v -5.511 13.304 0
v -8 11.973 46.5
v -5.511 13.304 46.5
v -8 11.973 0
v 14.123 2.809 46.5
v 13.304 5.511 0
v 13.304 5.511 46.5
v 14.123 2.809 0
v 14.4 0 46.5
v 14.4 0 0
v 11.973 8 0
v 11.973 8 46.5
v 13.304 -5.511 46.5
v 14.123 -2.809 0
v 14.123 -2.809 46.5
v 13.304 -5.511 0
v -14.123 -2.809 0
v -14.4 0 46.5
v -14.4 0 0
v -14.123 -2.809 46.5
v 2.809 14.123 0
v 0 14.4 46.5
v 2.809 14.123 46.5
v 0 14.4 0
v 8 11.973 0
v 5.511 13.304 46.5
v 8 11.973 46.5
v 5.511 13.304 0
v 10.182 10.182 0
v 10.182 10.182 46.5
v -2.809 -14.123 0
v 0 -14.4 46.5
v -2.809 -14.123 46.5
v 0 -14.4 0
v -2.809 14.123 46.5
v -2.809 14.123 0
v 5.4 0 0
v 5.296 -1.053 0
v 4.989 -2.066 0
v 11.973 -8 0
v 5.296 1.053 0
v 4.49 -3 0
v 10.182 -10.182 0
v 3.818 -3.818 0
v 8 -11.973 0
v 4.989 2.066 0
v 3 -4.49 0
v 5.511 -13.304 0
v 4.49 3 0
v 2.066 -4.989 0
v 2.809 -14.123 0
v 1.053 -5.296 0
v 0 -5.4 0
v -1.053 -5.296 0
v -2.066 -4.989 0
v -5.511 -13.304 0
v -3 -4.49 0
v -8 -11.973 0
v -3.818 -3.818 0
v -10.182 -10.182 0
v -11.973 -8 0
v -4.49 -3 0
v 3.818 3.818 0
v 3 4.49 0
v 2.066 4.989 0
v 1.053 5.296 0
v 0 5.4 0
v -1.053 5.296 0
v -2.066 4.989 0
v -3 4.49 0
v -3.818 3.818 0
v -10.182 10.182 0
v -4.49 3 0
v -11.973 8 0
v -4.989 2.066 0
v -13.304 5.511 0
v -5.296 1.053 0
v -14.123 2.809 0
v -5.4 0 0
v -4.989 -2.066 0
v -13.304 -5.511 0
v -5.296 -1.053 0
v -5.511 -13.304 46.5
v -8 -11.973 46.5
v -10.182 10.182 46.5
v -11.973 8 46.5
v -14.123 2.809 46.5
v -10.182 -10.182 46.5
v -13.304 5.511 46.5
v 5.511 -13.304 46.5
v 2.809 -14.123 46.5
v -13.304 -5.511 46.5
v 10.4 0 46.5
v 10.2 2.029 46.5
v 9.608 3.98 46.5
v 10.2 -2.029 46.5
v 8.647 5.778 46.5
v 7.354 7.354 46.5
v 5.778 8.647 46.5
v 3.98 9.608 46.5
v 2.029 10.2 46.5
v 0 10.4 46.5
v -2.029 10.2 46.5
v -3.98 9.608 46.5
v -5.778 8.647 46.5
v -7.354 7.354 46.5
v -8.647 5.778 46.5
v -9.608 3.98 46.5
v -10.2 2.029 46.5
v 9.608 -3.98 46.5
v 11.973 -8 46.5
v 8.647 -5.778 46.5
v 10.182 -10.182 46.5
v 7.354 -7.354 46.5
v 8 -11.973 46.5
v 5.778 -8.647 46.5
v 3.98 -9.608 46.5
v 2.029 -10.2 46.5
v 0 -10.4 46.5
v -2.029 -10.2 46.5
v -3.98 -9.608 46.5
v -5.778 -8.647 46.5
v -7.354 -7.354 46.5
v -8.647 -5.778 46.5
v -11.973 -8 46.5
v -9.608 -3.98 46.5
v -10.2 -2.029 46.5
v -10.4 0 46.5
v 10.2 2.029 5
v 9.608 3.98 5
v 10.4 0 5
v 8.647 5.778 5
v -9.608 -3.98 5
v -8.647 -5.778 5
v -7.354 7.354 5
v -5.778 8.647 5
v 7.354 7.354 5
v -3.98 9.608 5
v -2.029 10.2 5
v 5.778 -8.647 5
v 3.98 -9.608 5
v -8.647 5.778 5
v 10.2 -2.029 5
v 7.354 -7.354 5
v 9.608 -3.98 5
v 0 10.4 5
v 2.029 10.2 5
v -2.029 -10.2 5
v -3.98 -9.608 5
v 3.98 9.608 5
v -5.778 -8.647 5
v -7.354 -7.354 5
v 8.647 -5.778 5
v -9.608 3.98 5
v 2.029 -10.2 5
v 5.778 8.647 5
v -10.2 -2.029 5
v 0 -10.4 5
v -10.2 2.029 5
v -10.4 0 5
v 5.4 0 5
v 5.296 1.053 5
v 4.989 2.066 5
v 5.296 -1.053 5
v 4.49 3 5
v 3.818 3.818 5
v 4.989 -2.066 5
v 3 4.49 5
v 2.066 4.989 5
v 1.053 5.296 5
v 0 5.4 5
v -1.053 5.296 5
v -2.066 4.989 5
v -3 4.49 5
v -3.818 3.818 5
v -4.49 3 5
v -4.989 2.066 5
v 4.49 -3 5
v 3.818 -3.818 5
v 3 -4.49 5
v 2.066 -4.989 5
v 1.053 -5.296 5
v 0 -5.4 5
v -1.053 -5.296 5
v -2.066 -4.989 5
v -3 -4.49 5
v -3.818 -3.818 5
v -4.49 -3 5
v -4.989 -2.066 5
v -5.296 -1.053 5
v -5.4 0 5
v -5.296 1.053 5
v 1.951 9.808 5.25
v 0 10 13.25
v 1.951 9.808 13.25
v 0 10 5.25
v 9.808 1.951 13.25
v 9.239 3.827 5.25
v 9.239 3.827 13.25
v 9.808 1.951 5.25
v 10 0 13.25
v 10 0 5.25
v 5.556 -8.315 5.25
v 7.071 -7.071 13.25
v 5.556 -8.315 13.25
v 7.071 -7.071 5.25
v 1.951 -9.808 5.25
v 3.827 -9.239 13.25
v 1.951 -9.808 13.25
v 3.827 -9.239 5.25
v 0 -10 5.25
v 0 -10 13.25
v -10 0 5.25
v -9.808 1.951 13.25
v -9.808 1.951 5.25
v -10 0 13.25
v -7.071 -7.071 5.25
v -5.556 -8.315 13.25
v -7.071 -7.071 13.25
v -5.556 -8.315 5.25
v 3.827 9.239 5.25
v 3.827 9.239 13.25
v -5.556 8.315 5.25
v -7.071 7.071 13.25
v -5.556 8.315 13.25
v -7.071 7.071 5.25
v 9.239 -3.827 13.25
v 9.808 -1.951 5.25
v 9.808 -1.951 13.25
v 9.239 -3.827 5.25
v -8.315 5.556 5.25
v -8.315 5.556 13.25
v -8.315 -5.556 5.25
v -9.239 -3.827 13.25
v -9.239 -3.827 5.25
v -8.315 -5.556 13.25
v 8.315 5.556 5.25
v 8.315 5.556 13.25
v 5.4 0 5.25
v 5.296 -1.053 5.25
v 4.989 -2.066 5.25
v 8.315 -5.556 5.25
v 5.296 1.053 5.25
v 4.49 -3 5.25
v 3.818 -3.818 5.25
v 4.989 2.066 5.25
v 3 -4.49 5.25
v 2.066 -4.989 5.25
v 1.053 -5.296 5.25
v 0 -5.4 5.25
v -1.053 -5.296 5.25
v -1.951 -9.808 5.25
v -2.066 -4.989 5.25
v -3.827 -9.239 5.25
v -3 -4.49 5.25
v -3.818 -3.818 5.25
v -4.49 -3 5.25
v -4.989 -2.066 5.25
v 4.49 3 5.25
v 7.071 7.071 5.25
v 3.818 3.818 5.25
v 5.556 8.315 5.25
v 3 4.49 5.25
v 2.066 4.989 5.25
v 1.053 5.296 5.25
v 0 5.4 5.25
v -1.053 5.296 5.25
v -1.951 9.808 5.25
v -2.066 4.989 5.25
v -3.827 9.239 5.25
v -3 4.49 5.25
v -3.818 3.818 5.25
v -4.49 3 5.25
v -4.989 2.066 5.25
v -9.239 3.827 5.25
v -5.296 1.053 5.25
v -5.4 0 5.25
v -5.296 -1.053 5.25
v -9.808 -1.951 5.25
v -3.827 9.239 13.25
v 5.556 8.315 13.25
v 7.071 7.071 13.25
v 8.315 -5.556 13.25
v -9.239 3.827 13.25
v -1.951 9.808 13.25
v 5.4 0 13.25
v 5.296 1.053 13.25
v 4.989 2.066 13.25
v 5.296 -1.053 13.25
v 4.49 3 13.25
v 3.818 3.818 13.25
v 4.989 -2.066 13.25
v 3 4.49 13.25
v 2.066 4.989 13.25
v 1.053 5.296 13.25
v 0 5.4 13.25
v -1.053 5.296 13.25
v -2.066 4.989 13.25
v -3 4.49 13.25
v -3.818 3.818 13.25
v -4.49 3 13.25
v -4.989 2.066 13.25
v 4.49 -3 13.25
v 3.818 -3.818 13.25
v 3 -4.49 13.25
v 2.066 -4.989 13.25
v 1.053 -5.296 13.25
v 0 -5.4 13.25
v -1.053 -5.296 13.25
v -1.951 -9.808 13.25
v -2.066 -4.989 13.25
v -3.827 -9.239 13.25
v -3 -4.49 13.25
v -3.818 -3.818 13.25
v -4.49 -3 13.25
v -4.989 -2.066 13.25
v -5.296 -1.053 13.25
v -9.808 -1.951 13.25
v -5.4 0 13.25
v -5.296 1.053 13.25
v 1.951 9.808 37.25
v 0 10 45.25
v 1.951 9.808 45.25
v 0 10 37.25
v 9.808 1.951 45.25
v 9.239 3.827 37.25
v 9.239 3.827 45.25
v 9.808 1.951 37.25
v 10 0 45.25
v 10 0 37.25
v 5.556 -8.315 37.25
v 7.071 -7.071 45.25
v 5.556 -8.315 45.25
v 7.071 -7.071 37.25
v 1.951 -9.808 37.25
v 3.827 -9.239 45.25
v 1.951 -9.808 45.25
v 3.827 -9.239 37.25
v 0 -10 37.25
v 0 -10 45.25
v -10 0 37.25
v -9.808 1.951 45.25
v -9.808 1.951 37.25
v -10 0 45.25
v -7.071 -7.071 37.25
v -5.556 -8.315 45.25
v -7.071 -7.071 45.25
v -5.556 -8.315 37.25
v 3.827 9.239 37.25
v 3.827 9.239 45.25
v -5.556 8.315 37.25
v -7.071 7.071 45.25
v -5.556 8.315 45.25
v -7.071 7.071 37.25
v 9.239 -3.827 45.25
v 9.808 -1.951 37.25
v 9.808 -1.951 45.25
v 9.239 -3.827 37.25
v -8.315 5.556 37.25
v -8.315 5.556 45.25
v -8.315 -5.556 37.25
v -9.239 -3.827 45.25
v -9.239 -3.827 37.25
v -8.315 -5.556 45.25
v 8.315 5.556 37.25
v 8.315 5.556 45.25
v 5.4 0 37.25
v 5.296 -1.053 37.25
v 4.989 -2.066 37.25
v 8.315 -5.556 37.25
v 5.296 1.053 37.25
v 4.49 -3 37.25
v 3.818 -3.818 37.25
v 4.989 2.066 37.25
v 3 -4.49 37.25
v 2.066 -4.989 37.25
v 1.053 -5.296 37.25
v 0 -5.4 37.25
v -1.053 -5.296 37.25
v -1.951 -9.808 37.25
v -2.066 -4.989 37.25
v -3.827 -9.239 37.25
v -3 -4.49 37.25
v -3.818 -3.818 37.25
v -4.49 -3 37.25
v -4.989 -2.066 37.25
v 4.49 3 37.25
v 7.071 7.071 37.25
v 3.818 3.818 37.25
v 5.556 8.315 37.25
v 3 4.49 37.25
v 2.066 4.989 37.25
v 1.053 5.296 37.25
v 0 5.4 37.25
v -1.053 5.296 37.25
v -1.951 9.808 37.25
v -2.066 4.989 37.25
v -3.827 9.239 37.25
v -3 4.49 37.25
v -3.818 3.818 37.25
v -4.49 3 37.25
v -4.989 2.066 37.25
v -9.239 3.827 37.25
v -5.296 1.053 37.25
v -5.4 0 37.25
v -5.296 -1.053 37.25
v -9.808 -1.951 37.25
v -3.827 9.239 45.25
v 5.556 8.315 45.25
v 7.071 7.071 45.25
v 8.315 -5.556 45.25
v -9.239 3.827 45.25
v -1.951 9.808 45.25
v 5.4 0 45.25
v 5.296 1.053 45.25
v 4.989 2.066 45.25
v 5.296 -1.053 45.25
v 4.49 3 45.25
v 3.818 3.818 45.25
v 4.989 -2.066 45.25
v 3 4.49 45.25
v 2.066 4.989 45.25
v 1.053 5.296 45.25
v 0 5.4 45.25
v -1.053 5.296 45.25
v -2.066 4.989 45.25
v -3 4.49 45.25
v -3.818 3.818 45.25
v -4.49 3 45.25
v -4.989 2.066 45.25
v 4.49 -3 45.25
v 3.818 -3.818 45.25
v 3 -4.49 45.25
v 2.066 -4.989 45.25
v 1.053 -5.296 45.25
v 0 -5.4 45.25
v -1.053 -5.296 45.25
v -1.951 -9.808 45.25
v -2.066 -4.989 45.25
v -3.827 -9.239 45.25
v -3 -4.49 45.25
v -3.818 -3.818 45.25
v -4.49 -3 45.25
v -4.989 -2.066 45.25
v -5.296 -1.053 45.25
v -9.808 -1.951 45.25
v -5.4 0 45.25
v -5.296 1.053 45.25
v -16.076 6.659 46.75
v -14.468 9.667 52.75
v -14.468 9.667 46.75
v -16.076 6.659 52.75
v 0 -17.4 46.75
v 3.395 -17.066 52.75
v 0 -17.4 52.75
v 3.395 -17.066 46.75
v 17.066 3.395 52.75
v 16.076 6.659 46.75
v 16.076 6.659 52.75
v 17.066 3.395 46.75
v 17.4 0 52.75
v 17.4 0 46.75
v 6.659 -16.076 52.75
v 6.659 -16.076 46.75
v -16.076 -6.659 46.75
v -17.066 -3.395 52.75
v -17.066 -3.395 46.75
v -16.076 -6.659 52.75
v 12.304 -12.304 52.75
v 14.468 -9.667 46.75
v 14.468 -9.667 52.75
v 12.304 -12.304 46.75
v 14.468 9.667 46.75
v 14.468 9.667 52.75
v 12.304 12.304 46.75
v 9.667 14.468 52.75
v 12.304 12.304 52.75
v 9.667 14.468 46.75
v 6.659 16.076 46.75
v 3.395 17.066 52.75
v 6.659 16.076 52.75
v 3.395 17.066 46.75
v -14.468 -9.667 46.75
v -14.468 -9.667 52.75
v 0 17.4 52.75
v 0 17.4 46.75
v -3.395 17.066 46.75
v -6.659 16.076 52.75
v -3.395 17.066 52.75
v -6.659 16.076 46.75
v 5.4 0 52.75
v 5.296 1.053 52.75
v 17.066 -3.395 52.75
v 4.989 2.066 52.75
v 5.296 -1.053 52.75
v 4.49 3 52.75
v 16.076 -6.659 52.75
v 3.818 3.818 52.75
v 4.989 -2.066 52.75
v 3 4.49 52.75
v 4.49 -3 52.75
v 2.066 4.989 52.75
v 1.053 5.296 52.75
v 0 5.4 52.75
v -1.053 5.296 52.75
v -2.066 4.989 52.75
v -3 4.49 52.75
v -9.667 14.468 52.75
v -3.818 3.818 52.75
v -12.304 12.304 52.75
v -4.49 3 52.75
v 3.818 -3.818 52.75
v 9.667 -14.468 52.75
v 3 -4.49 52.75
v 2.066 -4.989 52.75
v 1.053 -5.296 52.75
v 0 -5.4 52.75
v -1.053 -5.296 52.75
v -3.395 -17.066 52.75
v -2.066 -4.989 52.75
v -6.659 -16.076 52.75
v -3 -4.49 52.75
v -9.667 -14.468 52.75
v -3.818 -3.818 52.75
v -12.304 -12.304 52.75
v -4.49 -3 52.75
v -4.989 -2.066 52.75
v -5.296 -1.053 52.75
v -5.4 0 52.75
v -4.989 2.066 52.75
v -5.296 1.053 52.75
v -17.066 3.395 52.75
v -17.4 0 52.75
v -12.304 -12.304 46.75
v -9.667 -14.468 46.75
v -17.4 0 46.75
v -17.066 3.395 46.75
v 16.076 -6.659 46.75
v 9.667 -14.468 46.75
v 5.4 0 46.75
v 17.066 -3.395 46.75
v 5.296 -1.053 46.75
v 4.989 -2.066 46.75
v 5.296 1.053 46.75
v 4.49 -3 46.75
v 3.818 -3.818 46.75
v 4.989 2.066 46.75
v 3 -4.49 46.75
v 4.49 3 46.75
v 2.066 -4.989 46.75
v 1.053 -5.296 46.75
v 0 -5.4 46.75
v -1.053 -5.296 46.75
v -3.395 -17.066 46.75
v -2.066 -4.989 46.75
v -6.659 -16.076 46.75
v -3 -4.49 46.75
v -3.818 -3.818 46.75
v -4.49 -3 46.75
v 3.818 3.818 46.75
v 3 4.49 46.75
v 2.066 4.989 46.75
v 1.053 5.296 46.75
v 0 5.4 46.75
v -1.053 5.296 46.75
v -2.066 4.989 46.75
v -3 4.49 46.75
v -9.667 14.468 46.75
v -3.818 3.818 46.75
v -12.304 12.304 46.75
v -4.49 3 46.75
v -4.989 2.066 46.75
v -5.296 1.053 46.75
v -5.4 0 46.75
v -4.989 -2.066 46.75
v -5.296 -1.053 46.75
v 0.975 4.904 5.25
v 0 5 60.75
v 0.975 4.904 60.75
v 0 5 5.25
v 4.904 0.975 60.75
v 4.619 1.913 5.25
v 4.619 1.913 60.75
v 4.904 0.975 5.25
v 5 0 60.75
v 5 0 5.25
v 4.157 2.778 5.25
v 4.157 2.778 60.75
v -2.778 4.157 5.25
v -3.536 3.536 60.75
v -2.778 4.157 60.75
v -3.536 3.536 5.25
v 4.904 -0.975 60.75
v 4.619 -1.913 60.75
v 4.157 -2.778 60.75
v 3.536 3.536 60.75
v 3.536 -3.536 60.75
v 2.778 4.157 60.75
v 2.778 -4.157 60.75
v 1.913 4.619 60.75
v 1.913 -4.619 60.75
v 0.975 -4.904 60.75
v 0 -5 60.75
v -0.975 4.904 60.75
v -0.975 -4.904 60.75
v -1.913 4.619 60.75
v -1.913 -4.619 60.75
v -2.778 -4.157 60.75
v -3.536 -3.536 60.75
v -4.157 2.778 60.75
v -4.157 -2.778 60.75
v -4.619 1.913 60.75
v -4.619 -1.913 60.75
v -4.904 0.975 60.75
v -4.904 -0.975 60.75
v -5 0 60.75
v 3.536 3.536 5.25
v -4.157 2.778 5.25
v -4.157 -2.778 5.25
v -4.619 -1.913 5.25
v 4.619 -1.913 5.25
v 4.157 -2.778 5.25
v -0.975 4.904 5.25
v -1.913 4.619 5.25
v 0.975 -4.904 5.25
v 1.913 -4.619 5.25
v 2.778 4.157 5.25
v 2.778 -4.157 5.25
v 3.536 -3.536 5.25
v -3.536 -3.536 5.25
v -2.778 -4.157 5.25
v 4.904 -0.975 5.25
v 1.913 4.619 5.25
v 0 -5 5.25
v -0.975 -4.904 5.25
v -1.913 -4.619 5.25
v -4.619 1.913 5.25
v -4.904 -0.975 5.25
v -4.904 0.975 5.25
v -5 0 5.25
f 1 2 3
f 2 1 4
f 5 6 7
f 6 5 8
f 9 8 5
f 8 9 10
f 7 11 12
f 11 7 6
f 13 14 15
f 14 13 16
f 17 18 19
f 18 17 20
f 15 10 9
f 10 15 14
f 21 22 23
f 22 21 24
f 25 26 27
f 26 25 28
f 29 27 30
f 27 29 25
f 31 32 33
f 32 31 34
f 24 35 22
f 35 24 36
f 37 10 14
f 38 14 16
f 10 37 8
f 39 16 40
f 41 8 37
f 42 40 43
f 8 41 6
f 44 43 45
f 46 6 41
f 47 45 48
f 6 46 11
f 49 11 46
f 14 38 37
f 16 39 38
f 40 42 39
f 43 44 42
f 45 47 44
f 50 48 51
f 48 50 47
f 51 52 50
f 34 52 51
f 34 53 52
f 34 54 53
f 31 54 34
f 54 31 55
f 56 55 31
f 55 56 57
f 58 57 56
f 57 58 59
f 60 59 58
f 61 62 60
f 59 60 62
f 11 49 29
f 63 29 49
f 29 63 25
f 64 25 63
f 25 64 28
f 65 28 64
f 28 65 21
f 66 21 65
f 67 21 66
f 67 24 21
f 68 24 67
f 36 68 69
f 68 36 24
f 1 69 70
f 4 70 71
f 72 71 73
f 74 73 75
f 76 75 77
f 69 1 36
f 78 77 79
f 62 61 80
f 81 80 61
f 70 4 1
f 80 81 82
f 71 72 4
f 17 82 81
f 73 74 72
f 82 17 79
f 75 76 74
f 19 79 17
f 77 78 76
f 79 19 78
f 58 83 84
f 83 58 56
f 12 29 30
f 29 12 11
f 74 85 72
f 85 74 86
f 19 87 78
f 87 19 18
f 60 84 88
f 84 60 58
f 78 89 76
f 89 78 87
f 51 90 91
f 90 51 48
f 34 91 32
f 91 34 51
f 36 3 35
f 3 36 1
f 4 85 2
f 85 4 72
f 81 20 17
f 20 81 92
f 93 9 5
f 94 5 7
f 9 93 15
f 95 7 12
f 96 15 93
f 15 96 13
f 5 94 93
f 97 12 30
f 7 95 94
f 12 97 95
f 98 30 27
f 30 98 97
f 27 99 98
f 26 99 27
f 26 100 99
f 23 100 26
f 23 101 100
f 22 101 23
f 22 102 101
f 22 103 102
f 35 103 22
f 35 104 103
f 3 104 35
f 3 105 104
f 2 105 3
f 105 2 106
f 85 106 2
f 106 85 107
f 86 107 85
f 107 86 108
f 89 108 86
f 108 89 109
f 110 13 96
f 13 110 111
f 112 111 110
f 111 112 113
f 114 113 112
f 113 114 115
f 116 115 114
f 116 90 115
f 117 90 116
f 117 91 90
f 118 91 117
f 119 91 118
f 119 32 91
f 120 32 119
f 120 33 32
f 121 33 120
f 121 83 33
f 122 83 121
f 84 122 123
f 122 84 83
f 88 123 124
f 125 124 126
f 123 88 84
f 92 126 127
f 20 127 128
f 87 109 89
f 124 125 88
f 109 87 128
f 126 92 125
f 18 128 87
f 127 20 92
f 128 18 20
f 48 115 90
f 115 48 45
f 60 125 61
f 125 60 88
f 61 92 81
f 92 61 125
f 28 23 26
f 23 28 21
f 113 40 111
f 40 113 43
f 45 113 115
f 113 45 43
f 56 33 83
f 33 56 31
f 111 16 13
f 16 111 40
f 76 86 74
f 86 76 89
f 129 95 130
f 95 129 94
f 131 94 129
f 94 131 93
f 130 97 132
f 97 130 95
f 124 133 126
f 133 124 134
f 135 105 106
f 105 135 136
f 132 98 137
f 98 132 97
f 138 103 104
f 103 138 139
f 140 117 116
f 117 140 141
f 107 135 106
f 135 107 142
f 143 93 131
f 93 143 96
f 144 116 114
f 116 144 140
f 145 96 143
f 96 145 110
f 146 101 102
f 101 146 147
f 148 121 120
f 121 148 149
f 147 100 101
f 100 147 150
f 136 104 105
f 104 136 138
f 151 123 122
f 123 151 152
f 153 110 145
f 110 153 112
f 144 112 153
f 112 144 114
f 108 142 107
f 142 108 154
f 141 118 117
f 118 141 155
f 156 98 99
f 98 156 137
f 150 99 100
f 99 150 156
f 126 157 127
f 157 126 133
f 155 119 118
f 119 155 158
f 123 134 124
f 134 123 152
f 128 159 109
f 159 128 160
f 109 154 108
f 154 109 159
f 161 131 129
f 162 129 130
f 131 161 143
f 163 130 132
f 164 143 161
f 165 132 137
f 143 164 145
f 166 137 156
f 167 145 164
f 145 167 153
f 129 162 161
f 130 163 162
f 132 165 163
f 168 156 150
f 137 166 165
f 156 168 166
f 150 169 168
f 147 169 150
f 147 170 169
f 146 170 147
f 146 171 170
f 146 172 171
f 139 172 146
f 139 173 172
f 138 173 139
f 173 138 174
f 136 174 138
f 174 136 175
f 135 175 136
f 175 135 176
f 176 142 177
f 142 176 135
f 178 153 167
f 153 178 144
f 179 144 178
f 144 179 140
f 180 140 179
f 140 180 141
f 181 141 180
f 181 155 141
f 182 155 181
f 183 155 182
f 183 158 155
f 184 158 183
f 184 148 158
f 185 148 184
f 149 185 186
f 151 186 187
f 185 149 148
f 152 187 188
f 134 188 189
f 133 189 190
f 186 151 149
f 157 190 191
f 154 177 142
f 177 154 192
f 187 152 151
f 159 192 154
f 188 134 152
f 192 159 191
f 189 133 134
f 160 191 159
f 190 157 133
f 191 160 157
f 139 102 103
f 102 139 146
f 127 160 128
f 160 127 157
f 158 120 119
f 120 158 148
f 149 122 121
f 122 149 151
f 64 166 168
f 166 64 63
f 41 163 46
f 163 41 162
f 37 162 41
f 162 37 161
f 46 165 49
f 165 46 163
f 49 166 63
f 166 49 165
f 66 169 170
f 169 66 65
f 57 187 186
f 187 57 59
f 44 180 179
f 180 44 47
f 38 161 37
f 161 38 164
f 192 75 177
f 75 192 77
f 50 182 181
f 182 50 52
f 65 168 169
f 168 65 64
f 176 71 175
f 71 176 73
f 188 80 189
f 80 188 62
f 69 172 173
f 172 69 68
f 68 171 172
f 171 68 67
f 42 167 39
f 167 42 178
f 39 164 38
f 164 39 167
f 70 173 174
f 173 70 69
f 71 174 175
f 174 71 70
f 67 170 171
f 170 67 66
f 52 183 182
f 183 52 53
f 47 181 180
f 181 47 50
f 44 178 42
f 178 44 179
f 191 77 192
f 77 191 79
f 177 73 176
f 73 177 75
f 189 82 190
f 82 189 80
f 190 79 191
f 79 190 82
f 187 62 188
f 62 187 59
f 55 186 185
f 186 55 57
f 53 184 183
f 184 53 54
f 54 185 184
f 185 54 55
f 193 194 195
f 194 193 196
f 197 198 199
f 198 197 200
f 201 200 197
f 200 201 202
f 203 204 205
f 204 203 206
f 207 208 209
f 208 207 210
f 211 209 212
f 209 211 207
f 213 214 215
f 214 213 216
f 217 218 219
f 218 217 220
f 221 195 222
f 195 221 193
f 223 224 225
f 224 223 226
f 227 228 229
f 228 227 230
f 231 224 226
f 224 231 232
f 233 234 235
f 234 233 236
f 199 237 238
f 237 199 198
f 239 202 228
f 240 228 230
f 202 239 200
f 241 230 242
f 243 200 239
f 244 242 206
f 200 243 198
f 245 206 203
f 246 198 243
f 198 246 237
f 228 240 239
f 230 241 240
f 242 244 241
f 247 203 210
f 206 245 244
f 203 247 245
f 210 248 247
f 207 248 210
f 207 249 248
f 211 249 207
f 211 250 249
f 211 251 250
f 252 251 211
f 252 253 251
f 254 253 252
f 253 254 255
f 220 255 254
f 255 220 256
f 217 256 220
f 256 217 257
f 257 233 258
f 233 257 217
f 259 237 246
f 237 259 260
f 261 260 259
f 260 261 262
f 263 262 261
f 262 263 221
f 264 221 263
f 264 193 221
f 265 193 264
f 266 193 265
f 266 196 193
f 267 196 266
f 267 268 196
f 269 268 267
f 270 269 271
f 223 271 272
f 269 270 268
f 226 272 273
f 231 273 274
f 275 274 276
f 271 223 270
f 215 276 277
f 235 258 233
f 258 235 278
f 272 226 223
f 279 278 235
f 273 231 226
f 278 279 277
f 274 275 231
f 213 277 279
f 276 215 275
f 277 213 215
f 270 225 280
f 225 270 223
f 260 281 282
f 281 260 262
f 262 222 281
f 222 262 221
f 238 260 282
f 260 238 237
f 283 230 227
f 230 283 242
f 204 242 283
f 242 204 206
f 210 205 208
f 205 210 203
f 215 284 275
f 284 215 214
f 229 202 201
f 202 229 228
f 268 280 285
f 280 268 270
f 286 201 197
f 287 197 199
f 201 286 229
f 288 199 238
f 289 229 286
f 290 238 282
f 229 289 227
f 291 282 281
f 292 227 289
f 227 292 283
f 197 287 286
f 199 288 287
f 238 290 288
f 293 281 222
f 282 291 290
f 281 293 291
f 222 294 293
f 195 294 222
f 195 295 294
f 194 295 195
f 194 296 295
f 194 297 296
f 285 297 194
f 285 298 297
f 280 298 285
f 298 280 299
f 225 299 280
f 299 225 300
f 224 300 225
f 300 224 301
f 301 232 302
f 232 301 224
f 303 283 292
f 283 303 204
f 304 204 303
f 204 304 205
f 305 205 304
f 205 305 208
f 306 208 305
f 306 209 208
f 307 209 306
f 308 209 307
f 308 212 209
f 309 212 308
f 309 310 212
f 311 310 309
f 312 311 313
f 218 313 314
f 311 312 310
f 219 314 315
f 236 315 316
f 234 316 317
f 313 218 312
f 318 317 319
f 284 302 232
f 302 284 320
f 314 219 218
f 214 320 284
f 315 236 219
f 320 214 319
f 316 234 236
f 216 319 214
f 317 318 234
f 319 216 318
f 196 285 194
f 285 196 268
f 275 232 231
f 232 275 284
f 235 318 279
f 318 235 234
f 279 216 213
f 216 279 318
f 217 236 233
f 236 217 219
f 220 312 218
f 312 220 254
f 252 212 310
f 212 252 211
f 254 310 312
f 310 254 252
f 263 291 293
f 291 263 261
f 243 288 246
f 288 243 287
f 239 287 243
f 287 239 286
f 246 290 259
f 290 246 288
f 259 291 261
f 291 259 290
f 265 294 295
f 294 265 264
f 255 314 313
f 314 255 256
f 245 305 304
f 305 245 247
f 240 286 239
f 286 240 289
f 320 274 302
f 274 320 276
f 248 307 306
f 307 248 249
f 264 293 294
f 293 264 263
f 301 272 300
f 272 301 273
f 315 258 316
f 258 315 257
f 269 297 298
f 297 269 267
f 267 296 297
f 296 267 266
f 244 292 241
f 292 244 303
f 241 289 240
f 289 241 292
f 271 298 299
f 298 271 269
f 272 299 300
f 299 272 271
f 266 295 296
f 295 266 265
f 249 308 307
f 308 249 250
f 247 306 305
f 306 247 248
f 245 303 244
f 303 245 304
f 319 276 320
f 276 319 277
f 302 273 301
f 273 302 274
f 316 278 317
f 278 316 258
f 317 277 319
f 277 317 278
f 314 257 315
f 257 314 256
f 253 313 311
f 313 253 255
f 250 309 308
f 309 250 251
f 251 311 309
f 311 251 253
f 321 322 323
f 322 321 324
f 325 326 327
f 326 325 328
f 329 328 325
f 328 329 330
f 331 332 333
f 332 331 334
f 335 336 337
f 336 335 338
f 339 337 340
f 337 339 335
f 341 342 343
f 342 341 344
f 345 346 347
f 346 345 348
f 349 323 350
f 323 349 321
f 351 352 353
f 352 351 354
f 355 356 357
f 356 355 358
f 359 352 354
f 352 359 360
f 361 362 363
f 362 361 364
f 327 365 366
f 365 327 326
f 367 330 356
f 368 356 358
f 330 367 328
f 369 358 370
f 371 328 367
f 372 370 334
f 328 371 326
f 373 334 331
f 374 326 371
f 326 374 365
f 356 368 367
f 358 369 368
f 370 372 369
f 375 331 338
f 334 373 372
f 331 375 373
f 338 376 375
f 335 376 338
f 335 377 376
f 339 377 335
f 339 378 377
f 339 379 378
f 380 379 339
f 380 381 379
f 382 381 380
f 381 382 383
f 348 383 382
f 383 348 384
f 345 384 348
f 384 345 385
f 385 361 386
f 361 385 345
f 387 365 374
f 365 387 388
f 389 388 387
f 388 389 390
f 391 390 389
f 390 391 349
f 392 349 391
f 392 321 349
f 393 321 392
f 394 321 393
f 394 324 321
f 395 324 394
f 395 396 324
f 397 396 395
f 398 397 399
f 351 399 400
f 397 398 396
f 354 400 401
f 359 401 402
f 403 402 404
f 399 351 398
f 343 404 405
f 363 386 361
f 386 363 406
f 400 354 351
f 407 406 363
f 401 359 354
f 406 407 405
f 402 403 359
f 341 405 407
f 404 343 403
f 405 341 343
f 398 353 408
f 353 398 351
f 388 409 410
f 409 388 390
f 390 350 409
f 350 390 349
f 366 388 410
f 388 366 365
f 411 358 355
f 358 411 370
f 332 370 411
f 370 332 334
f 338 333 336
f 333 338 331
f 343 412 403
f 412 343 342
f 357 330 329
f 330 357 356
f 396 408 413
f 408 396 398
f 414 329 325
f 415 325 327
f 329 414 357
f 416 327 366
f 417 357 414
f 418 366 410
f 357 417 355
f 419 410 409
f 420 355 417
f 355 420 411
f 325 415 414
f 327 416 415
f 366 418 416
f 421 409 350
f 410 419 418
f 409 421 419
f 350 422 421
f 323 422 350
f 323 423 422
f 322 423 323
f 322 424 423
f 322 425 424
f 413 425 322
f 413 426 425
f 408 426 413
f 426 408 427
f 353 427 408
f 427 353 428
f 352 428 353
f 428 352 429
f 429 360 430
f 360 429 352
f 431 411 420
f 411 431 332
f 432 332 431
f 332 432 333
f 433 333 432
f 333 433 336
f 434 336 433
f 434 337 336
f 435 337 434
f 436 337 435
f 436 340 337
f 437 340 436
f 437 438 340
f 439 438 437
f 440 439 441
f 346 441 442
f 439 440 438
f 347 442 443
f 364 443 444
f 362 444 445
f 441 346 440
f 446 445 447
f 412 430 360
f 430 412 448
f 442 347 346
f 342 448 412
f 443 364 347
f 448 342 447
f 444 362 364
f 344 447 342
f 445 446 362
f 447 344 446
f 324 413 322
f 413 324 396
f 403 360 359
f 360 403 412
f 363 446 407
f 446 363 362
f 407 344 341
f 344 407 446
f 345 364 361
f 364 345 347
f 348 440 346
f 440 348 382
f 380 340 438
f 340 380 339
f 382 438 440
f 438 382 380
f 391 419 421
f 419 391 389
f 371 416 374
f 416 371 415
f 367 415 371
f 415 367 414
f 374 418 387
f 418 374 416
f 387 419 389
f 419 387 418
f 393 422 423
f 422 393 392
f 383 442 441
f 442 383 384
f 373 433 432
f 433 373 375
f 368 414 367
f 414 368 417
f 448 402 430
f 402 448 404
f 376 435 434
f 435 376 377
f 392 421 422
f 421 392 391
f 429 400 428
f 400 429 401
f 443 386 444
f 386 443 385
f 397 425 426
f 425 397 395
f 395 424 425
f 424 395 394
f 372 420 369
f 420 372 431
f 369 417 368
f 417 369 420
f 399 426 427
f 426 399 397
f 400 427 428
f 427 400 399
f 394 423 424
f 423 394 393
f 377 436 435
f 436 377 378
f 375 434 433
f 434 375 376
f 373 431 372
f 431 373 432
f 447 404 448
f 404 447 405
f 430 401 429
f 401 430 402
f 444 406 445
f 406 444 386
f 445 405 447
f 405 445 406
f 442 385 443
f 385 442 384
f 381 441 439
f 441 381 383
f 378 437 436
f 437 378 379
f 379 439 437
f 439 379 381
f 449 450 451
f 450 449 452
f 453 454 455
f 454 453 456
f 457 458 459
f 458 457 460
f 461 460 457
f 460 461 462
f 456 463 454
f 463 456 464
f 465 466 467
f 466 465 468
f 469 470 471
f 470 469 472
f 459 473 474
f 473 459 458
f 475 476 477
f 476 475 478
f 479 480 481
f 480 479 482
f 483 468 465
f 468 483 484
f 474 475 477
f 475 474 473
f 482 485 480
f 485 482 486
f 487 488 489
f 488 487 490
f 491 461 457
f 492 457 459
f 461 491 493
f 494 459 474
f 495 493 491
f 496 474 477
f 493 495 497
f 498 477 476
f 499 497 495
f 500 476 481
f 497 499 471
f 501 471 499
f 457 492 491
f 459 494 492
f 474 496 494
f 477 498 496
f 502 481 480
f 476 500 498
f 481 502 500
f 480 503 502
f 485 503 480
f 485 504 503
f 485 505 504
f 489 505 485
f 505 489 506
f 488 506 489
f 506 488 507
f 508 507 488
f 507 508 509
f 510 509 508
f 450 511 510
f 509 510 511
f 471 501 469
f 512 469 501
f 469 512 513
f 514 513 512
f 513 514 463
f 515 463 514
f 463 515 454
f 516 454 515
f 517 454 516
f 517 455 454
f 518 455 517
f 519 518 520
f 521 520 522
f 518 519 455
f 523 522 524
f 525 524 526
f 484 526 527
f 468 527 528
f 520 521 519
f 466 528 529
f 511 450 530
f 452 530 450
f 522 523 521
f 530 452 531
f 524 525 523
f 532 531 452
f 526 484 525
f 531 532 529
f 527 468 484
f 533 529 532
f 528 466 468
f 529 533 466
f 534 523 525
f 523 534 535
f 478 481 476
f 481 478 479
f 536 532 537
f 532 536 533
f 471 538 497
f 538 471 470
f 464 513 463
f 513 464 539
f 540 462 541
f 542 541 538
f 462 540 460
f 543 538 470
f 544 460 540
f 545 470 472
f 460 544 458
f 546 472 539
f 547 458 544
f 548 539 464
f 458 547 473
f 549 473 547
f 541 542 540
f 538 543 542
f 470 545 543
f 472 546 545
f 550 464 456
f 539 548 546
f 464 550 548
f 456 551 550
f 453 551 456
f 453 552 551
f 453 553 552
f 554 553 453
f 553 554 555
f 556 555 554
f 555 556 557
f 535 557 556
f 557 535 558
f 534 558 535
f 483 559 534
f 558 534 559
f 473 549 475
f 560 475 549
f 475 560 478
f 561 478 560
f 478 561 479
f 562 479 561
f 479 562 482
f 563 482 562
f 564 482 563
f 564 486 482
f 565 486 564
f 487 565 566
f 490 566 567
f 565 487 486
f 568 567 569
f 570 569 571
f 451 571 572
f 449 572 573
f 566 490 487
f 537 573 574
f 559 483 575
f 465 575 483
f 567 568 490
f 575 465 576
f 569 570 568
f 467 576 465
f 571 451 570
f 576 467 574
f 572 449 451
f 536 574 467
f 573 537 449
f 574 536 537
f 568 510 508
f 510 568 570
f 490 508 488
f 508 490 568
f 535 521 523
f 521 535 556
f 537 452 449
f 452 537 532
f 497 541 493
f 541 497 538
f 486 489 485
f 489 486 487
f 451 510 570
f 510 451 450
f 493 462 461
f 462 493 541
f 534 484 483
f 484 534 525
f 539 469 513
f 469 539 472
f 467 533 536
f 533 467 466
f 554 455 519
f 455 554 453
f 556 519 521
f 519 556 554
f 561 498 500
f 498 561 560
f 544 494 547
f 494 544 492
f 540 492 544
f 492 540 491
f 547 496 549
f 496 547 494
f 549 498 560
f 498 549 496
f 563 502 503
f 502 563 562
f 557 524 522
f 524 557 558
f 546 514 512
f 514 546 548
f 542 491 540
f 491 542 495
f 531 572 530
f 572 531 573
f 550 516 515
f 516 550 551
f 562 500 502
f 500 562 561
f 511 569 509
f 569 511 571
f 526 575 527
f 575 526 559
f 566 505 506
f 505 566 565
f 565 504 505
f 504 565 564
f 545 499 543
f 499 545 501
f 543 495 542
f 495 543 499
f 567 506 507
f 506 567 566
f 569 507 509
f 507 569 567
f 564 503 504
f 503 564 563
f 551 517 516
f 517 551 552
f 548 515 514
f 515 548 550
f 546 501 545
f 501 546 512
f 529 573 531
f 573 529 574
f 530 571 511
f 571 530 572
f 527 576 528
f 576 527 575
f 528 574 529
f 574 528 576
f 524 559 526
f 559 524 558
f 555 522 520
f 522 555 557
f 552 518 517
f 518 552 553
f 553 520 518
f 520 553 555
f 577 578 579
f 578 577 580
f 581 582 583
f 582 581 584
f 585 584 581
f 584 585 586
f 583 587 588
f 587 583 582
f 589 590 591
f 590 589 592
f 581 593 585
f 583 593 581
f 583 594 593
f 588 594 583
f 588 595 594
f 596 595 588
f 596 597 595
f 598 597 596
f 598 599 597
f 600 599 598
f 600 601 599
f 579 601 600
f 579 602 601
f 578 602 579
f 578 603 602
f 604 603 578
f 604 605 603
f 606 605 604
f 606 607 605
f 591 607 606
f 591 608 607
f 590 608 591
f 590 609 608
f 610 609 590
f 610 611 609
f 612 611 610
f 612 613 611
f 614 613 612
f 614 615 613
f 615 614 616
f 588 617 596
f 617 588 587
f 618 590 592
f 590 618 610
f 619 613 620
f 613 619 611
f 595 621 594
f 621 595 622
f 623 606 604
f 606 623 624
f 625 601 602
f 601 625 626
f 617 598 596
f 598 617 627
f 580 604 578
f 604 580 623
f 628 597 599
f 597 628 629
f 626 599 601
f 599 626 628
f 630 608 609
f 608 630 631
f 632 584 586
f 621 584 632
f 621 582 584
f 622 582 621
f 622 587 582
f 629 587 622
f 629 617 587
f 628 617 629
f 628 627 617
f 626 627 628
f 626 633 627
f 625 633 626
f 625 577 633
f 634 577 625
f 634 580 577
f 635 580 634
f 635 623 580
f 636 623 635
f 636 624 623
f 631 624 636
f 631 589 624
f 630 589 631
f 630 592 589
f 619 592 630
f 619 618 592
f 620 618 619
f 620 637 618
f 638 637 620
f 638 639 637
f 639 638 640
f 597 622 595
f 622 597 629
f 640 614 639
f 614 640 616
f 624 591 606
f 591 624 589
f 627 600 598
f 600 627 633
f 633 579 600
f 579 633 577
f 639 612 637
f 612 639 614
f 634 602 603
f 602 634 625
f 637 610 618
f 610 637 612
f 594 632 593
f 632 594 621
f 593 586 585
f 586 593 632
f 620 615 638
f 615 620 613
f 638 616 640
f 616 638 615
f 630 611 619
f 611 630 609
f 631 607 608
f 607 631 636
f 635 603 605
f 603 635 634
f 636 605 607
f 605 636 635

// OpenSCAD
$fn = 32;

// ------------------------------------------------------------------------
// Shaft station: cup d28.8 x 46.5 mm, shaft d10
// Every part is its own module, assembly() places every instance.
// ------------------------------------------------------------------------

// --- part 1 ---
module housing_cup() {
  difference() {
    cylinder(h = 46.5, d = 28.8);
    translate([0, 0, 5]) cylinder(h = 42.5, d = 20.8);
    translate([0, 0, -1]) cylinder(h = 7, d = 10.8);
  }
}

// --- part 2 ---
module bearing_lower() {
  difference() {
      translate([0, 0, 0]) cylinder(h = 8, d = 20);
      translate([0, 0, -1]) cylinder(h = 10, d = 10.8);
    }
}

// --- part 3 ---
module bearing_upper() {
  difference() {
      translate([0, 0, 0]) cylinder(h = 8, d = 20);
      translate([0, 0, -1]) cylinder(h = 10, d = 10.8);
    }
}

// --- part 4 ---
module station_shaft() {
  translate([0, 0, -27.75]) cylinder(h = 55.5, d = 10);
}

// --- part 5 ---
module station_cover() {
  difference() {
    cylinder(h = 6, d = 34.8);
    translate([0, 0, -1]) cylinder(h = 8, d = 10.8);
  }
}

// --- assembly ---
module assembly() {
  color([0.80, 0.24, 0.20]) translate([0, 0, 0]) rotate([0, 0, 0]) housing_cup();
  color([0.20, 0.45, 0.75]) translate([0, 0, 5.25]) rotate([0, 0, 0]) bearing_lower();
  color([0.25, 0.62, 0.32]) translate([0, 0, 37.25]) rotate([0, 0, 0]) bearing_upper();
  color([0.92, 0.70, 0.18]) translate([0, 0, 33]) rotate([0, 0, 0]) station_shaft();
  color([0.58, 0.35, 0.70]) translate([0, 0, 46.75]) rotate([0, 0, 0]) station_cover();
}

assembly();
